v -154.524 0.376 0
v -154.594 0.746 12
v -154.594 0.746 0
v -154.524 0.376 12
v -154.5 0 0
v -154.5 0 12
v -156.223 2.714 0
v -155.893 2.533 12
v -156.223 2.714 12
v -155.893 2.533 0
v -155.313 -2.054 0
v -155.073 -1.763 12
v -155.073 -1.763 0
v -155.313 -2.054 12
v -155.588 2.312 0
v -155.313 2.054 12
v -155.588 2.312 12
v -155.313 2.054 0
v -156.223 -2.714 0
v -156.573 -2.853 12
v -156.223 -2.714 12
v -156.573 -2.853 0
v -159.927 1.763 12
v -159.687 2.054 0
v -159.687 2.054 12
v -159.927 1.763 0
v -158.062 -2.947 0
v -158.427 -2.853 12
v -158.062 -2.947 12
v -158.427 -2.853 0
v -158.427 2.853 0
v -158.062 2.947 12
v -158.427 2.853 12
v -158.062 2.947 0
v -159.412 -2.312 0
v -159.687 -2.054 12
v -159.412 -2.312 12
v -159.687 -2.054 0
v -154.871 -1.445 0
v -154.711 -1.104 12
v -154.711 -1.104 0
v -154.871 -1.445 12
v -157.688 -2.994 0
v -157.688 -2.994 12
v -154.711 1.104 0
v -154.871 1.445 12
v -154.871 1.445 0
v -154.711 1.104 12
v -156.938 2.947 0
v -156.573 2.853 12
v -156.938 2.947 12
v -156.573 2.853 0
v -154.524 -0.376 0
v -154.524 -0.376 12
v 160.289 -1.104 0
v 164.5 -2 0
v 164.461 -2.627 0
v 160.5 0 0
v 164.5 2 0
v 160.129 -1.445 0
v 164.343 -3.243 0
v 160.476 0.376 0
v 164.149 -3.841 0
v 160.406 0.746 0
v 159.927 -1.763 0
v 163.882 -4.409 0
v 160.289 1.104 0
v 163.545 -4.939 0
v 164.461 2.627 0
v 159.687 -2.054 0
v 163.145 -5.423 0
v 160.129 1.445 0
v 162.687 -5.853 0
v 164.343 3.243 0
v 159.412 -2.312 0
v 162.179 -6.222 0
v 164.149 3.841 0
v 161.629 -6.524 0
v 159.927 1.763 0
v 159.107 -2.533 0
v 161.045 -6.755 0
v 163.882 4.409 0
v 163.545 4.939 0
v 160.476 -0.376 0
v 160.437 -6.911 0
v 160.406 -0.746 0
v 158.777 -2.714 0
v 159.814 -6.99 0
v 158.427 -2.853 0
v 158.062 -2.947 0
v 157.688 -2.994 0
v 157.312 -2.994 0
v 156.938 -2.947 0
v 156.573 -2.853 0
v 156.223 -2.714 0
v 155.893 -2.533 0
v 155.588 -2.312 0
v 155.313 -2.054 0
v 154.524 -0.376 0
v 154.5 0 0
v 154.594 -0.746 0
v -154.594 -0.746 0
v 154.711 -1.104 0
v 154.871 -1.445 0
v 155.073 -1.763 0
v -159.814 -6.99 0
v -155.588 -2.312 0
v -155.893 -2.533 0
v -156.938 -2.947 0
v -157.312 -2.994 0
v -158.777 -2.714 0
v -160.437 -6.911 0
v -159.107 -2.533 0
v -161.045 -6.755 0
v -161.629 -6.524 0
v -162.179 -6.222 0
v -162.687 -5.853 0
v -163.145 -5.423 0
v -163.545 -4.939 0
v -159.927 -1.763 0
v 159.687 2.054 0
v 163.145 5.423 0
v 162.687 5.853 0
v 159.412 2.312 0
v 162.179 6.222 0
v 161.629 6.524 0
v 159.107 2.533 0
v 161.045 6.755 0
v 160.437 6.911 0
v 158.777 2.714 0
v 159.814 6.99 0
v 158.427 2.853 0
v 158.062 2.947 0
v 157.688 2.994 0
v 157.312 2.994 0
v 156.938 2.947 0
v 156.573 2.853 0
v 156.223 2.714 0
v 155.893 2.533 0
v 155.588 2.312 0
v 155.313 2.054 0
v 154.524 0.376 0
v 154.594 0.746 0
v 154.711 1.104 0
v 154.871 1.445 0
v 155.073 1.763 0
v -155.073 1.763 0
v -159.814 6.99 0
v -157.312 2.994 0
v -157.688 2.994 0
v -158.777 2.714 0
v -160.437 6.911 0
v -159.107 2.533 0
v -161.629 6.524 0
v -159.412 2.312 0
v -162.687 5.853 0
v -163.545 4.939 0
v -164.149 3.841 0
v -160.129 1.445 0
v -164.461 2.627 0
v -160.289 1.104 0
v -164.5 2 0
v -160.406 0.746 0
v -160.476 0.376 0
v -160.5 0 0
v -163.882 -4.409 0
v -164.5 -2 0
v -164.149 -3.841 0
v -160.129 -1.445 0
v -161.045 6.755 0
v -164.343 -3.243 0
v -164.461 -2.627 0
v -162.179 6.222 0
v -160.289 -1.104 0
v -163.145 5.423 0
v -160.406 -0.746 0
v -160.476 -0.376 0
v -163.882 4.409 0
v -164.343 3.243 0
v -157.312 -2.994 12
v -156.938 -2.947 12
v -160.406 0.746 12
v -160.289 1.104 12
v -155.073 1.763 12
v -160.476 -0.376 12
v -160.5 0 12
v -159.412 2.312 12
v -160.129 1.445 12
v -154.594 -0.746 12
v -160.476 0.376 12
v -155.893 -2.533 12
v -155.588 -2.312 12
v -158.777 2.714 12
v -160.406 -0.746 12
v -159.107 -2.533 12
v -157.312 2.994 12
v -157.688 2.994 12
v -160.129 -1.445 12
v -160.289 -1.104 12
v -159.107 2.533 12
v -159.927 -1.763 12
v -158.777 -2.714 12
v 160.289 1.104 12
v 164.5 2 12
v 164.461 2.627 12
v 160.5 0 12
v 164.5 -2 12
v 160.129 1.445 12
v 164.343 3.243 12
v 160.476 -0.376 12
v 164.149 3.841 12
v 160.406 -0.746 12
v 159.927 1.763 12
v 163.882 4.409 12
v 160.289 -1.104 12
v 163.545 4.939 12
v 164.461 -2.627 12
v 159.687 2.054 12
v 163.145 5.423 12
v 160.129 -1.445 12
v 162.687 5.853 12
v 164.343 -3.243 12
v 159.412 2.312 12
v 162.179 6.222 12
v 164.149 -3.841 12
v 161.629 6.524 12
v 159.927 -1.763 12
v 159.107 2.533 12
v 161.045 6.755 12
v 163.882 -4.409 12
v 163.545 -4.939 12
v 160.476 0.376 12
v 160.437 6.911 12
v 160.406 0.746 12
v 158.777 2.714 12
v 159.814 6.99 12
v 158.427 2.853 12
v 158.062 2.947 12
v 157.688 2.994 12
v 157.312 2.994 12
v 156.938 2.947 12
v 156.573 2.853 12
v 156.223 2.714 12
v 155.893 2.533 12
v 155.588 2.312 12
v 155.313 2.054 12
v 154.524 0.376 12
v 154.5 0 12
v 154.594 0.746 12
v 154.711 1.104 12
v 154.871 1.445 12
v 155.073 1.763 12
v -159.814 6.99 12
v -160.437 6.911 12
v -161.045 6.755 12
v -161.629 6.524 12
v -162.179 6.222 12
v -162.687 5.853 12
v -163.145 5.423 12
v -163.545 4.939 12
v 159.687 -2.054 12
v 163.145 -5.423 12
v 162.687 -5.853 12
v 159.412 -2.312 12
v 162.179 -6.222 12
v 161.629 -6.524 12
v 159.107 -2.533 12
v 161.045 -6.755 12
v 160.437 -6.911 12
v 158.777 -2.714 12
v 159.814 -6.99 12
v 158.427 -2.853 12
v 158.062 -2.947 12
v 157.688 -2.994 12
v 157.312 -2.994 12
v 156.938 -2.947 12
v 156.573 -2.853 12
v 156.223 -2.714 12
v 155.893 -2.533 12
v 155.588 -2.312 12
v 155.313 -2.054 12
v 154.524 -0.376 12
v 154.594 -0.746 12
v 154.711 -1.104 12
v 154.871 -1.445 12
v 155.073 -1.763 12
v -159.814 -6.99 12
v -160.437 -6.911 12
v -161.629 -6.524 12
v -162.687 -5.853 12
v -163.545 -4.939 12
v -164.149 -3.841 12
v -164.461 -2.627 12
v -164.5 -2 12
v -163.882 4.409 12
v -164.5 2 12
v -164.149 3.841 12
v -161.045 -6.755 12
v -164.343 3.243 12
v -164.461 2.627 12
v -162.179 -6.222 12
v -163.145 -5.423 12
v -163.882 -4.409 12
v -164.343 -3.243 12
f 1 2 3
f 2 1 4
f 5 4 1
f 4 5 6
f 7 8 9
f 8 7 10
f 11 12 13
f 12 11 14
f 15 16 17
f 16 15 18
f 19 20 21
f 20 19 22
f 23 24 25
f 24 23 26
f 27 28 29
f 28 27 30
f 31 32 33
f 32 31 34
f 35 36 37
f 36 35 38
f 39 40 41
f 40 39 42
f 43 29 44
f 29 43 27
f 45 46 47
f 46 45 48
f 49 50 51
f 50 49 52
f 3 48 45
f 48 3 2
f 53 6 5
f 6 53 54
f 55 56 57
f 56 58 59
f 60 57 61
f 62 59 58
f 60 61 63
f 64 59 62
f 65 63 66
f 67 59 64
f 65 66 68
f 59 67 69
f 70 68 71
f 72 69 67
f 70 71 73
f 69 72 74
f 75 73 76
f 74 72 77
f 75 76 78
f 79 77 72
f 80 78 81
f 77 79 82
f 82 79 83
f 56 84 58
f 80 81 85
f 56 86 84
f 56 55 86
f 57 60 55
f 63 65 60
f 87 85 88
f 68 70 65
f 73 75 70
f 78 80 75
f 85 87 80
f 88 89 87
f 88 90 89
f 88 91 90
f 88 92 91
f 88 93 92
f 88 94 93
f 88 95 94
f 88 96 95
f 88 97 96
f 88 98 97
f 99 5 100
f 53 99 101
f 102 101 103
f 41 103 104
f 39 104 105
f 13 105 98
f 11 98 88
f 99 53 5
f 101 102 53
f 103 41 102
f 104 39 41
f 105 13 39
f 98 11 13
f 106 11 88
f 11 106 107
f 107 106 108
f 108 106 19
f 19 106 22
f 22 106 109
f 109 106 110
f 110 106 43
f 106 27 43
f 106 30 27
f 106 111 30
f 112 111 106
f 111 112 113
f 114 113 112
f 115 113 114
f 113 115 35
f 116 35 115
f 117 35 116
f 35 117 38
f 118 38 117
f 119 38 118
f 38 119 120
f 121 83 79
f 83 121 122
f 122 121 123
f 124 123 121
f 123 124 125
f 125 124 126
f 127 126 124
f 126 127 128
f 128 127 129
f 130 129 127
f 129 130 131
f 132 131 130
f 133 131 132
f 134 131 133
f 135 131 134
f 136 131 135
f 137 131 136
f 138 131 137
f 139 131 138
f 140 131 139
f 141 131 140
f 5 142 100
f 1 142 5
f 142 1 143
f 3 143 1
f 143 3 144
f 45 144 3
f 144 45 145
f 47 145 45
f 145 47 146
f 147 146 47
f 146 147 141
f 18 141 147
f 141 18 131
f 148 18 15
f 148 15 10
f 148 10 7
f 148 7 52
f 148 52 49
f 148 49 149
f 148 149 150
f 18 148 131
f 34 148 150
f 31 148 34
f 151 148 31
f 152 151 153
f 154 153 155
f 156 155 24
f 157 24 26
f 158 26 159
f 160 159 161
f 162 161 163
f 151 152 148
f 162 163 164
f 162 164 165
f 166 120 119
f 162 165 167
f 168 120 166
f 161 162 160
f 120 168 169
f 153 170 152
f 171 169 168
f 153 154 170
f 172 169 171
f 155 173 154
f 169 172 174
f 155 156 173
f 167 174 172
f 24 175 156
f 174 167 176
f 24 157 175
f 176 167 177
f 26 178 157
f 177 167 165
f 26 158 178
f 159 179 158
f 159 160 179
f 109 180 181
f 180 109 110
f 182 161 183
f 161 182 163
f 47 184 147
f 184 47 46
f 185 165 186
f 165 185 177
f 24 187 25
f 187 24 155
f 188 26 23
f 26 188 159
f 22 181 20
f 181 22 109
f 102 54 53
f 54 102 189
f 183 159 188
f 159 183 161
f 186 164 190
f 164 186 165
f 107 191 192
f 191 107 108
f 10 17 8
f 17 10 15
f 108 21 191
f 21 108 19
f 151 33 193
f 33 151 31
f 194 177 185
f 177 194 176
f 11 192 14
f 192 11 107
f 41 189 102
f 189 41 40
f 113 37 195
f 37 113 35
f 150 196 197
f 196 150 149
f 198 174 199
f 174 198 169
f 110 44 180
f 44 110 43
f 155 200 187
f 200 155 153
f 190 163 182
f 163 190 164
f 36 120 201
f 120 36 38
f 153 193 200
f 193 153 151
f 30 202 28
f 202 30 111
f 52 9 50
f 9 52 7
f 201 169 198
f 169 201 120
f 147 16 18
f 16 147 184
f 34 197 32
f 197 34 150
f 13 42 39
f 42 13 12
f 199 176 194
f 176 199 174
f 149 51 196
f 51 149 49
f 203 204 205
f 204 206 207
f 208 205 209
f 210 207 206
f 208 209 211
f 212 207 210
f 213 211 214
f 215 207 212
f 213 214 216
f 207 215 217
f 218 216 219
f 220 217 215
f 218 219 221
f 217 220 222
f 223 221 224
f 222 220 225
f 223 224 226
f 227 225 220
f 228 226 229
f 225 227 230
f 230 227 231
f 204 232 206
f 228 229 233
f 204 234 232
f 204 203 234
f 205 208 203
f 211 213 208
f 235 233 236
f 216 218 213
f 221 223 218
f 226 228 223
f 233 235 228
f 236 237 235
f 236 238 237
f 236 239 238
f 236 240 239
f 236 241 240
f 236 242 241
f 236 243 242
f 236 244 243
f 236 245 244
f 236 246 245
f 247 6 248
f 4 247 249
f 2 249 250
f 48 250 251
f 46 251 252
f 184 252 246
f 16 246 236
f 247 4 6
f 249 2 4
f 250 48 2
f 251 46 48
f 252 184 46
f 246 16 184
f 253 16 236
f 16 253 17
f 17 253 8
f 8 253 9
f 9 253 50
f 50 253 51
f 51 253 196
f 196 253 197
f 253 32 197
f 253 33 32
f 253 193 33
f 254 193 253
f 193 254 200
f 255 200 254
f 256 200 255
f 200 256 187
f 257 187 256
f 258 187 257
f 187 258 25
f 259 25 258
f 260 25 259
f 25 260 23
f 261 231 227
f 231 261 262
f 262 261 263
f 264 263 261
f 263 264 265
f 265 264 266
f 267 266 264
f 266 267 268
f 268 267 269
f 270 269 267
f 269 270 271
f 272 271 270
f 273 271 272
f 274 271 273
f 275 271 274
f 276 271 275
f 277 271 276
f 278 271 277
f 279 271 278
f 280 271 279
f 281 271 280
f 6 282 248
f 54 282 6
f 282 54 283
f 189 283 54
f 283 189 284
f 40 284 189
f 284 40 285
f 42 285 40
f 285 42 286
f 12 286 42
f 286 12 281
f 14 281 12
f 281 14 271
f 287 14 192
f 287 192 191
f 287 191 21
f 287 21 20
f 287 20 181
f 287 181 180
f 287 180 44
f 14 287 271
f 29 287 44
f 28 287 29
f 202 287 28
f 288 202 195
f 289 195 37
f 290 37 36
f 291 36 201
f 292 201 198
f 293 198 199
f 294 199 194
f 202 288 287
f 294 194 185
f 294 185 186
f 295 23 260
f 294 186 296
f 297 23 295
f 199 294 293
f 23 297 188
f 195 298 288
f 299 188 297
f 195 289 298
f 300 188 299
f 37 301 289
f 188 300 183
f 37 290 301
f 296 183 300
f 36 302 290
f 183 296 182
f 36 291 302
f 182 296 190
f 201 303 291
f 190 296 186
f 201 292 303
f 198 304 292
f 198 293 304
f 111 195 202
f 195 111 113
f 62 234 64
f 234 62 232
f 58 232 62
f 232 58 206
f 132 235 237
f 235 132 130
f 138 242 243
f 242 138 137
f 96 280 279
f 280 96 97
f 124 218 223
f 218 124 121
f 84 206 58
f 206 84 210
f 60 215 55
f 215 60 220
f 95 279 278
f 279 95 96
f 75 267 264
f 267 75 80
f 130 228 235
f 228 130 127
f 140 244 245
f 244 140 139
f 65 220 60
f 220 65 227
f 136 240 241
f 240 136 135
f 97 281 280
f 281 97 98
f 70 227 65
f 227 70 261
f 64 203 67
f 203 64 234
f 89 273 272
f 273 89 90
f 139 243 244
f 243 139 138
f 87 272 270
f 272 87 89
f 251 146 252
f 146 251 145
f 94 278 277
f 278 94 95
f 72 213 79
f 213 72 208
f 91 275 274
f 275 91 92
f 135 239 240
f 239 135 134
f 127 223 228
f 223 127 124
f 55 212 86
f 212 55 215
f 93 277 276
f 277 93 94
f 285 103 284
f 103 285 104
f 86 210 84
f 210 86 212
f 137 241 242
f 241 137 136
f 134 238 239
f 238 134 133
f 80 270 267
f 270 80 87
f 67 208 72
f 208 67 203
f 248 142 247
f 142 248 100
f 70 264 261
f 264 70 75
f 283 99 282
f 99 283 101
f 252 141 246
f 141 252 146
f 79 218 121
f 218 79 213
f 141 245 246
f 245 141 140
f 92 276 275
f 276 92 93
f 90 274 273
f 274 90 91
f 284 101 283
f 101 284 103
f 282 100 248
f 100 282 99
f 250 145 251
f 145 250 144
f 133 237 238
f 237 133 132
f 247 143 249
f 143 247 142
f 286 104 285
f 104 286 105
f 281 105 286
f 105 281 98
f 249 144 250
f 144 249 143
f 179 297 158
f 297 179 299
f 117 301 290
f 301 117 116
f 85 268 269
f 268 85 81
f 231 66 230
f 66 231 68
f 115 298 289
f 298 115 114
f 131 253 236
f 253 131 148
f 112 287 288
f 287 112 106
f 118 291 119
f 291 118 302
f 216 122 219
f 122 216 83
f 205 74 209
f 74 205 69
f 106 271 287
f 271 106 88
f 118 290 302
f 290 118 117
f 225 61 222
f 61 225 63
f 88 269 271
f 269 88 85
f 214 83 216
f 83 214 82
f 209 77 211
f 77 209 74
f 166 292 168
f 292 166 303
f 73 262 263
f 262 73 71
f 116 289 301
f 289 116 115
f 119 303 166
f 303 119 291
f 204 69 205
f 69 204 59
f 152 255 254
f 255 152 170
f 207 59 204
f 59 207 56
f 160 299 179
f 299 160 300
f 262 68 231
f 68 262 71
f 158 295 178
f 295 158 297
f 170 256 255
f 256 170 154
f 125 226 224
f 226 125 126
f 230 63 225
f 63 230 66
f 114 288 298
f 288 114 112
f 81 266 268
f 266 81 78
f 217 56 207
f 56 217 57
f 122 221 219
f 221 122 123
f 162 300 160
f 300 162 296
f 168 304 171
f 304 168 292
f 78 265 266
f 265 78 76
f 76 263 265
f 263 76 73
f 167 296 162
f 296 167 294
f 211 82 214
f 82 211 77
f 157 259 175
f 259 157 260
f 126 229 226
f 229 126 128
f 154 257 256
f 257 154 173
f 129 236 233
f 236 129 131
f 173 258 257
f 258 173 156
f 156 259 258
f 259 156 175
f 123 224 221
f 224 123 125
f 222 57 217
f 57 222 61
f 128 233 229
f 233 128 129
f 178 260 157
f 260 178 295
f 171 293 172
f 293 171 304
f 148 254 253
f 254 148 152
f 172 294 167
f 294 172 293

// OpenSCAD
$fn = 50;


difference() {
	union() {
		hull() {
			translate(v = [-159.5000000000, 2.0000000000, 0]) {
				cylinder(h = 12, r = 5);
			}
			translate(v = [159.5000000000, 2.0000000000, 0]) {
				cylinder(h = 12, r = 5);
			}
			translate(v = [-159.5000000000, -2.0000000000, 0]) {
				cylinder(h = 12, r = 5);
			}
			translate(v = [159.5000000000, -2.0000000000, 0]) {
				cylinder(h = 12, r = 5);
			}
		}
	}
	union() {
		translate(v = [-157.5000000000, 0.0000000000, 0]) {
			cylinder(h = 12, r = 3.0000000000);
		}
		translate(v = [157.5000000000, 0.0000000000, 0]) {
			cylinder(h = 12, r = 3.0000000000);
		}
		translate(v = [-157.5000000000, 0.0000000000, 0]) {
			cylinder(h = 12, r = 1.5000000000);
		}
		translate(v = [157.5000000000, 0.0000000000, 0]) {
			cylinder(h = 12, r = 1.5000000000);
		}
		translate(v = [-157.5000000000, 0.0000000000, 0]) {
			cylinder(h = 12, r = 1.5000000000);
		}
		translate(v = [157.5000000000, 0.0000000000, 0]) {
			cylinder(h = 12, r = 1.5000000000);
		}
		translate(v = [-157.5000000000, 0.0000000000, 0]) {
			cylinder(h = 12, r = 1.5000000000);
		}
		translate(v = [157.5000000000, 0.0000000000, 0]) {
			cylinder(h = 12, r = 1.5000000000);
		}
	}
}
